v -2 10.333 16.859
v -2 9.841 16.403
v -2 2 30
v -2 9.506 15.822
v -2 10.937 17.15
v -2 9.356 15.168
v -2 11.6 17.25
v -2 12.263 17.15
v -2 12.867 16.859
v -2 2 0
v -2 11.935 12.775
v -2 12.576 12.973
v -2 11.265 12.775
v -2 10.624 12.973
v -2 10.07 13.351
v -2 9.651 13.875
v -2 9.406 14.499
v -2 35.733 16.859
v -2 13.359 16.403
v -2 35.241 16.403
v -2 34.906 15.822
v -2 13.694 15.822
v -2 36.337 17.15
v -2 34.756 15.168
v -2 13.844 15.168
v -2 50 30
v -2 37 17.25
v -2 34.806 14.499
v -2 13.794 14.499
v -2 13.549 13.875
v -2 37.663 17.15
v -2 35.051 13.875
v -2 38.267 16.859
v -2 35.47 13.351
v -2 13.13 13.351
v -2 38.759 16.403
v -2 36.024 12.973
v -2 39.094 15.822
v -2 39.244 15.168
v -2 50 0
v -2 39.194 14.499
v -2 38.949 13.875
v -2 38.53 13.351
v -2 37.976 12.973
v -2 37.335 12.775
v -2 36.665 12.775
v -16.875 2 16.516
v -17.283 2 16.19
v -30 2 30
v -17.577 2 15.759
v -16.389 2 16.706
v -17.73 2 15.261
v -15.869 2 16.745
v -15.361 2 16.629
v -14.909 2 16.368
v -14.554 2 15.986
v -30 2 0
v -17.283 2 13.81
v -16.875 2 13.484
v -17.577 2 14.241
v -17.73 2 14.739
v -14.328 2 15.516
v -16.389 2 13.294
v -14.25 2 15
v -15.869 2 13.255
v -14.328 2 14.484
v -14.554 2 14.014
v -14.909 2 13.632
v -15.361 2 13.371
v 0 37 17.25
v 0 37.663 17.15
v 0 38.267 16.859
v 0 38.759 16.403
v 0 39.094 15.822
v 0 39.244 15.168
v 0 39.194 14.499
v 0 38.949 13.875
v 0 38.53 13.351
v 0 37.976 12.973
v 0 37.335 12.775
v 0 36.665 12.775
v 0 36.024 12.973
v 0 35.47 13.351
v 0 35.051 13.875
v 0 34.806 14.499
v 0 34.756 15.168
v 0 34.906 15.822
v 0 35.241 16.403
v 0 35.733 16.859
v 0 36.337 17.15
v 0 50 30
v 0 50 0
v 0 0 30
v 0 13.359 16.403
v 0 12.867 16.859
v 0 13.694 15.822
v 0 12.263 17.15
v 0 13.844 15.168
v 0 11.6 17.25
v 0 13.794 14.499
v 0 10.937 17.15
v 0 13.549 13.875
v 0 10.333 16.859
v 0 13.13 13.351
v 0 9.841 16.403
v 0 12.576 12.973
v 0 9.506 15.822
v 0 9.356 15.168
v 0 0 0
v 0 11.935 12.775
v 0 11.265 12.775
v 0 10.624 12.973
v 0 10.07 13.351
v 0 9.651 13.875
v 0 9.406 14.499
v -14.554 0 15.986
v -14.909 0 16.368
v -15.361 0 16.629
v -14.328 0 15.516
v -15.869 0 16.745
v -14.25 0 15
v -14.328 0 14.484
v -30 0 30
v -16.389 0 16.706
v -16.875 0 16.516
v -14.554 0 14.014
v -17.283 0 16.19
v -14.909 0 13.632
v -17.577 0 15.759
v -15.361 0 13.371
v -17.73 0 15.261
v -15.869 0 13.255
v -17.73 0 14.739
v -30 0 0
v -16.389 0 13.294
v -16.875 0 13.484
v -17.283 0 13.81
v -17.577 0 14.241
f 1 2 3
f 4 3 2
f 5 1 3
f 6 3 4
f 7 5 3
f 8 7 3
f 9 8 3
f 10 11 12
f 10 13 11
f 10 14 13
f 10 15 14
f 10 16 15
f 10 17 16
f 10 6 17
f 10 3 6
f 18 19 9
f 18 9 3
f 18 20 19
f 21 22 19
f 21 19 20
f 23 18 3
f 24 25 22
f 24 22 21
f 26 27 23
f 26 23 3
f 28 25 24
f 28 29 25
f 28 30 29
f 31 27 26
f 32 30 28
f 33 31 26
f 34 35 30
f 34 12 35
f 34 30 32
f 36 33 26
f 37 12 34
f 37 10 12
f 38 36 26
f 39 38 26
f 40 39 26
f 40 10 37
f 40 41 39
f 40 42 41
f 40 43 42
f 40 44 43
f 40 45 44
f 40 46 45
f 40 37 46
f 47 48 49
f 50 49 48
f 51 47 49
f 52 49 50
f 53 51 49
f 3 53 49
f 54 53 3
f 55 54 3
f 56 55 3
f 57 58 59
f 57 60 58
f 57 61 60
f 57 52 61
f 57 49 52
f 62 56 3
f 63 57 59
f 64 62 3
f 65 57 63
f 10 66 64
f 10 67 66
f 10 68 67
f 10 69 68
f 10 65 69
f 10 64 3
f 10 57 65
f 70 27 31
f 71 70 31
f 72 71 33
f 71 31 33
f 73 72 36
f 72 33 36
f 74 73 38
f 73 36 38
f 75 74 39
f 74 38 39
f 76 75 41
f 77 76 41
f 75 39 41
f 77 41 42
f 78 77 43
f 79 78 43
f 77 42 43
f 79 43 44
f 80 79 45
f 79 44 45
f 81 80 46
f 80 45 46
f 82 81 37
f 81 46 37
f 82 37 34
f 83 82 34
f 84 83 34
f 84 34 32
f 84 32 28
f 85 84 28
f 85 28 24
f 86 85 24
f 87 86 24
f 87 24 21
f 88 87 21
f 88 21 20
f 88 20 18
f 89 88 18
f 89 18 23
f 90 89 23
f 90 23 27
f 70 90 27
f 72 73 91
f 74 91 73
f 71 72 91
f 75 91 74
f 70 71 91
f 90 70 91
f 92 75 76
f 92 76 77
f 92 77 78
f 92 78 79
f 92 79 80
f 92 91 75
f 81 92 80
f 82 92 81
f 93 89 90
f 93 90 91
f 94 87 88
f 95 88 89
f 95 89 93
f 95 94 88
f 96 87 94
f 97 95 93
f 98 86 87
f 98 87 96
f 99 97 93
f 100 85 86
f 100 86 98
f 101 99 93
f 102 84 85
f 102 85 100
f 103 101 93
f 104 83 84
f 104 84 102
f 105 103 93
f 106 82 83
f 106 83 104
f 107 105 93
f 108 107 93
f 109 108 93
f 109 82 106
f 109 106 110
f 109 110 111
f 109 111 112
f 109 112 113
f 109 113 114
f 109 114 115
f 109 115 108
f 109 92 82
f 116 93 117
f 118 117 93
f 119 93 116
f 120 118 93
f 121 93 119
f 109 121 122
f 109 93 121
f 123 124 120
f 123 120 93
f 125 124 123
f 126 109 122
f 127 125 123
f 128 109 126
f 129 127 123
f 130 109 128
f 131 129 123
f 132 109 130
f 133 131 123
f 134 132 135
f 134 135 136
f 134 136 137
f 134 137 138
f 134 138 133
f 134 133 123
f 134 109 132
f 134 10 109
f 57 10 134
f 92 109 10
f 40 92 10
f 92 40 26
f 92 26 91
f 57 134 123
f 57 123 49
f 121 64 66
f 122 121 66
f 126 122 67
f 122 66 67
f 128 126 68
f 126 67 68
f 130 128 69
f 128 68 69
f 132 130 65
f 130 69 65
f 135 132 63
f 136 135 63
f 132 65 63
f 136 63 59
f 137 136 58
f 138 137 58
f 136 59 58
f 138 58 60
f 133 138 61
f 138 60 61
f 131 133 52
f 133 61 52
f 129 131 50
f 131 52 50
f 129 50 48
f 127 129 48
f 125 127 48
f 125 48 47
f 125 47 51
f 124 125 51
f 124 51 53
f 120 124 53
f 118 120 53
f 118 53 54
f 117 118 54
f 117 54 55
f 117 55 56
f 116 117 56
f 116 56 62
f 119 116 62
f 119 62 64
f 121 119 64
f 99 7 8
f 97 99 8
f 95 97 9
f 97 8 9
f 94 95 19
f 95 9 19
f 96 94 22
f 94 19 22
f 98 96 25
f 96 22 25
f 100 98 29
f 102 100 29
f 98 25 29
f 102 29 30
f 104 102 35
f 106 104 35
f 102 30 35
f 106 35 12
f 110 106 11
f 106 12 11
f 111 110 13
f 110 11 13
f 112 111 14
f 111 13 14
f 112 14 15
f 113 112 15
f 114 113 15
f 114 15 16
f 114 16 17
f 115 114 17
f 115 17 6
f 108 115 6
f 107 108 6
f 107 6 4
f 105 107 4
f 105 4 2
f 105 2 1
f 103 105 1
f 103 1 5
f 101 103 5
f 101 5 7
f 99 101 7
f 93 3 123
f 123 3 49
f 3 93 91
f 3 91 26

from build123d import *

# Parameters (mm, degrees)
ESTRUSIONE_ESTRUSIONE1_DEPTH = 30
SCHIZZO2_R                   = 2.25
TAGLIO_ESTRUSIONE1_DEPTH     = 3
SCHIZZO3_R                   = 1.75
TAGLIO_ESTRUSIONE2_DEPTH     = 3


with BuildPart() as part:
    # Schizzo1 → Estrusione-Estrusione1 (new body)
    with BuildSketch(Plane.XY):
        Polygon((0, 0), (-30, 0), (-30, 2), (-2, 2), (-2, 50), (0, 50), align=None)
    extrude(amount=ESTRUSIONE_ESTRUSIONE1_DEPTH)

    # Schizzo2 → Taglio-Estrusione1 (cut, through all)
    with BuildSketch(Plane.ZY.offset(2)):
        with Locations((15, 37)):
            Circle(SCHIZZO2_R)
        with Locations((15, 11.6)):
            Circle(SCHIZZO2_R)
    extrude(amount=-TAGLIO_ESTRUSIONE1_DEPTH, mode=Mode.SUBTRACT)

    # Schizzo3 → Taglio-Estrusione2 (cut, through all)
    with BuildSketch(Plane(origin=(0, 2, 0), x_dir=(1, 0, 0), z_dir=(0, 1, 0))):
        with Locations((-16, -15)):
            Circle(SCHIZZO3_R)
    extrude(amount=-TAGLIO_ESTRUSIONE2_DEPTH, mode=Mode.SUBTRACT)


solid = part.part
